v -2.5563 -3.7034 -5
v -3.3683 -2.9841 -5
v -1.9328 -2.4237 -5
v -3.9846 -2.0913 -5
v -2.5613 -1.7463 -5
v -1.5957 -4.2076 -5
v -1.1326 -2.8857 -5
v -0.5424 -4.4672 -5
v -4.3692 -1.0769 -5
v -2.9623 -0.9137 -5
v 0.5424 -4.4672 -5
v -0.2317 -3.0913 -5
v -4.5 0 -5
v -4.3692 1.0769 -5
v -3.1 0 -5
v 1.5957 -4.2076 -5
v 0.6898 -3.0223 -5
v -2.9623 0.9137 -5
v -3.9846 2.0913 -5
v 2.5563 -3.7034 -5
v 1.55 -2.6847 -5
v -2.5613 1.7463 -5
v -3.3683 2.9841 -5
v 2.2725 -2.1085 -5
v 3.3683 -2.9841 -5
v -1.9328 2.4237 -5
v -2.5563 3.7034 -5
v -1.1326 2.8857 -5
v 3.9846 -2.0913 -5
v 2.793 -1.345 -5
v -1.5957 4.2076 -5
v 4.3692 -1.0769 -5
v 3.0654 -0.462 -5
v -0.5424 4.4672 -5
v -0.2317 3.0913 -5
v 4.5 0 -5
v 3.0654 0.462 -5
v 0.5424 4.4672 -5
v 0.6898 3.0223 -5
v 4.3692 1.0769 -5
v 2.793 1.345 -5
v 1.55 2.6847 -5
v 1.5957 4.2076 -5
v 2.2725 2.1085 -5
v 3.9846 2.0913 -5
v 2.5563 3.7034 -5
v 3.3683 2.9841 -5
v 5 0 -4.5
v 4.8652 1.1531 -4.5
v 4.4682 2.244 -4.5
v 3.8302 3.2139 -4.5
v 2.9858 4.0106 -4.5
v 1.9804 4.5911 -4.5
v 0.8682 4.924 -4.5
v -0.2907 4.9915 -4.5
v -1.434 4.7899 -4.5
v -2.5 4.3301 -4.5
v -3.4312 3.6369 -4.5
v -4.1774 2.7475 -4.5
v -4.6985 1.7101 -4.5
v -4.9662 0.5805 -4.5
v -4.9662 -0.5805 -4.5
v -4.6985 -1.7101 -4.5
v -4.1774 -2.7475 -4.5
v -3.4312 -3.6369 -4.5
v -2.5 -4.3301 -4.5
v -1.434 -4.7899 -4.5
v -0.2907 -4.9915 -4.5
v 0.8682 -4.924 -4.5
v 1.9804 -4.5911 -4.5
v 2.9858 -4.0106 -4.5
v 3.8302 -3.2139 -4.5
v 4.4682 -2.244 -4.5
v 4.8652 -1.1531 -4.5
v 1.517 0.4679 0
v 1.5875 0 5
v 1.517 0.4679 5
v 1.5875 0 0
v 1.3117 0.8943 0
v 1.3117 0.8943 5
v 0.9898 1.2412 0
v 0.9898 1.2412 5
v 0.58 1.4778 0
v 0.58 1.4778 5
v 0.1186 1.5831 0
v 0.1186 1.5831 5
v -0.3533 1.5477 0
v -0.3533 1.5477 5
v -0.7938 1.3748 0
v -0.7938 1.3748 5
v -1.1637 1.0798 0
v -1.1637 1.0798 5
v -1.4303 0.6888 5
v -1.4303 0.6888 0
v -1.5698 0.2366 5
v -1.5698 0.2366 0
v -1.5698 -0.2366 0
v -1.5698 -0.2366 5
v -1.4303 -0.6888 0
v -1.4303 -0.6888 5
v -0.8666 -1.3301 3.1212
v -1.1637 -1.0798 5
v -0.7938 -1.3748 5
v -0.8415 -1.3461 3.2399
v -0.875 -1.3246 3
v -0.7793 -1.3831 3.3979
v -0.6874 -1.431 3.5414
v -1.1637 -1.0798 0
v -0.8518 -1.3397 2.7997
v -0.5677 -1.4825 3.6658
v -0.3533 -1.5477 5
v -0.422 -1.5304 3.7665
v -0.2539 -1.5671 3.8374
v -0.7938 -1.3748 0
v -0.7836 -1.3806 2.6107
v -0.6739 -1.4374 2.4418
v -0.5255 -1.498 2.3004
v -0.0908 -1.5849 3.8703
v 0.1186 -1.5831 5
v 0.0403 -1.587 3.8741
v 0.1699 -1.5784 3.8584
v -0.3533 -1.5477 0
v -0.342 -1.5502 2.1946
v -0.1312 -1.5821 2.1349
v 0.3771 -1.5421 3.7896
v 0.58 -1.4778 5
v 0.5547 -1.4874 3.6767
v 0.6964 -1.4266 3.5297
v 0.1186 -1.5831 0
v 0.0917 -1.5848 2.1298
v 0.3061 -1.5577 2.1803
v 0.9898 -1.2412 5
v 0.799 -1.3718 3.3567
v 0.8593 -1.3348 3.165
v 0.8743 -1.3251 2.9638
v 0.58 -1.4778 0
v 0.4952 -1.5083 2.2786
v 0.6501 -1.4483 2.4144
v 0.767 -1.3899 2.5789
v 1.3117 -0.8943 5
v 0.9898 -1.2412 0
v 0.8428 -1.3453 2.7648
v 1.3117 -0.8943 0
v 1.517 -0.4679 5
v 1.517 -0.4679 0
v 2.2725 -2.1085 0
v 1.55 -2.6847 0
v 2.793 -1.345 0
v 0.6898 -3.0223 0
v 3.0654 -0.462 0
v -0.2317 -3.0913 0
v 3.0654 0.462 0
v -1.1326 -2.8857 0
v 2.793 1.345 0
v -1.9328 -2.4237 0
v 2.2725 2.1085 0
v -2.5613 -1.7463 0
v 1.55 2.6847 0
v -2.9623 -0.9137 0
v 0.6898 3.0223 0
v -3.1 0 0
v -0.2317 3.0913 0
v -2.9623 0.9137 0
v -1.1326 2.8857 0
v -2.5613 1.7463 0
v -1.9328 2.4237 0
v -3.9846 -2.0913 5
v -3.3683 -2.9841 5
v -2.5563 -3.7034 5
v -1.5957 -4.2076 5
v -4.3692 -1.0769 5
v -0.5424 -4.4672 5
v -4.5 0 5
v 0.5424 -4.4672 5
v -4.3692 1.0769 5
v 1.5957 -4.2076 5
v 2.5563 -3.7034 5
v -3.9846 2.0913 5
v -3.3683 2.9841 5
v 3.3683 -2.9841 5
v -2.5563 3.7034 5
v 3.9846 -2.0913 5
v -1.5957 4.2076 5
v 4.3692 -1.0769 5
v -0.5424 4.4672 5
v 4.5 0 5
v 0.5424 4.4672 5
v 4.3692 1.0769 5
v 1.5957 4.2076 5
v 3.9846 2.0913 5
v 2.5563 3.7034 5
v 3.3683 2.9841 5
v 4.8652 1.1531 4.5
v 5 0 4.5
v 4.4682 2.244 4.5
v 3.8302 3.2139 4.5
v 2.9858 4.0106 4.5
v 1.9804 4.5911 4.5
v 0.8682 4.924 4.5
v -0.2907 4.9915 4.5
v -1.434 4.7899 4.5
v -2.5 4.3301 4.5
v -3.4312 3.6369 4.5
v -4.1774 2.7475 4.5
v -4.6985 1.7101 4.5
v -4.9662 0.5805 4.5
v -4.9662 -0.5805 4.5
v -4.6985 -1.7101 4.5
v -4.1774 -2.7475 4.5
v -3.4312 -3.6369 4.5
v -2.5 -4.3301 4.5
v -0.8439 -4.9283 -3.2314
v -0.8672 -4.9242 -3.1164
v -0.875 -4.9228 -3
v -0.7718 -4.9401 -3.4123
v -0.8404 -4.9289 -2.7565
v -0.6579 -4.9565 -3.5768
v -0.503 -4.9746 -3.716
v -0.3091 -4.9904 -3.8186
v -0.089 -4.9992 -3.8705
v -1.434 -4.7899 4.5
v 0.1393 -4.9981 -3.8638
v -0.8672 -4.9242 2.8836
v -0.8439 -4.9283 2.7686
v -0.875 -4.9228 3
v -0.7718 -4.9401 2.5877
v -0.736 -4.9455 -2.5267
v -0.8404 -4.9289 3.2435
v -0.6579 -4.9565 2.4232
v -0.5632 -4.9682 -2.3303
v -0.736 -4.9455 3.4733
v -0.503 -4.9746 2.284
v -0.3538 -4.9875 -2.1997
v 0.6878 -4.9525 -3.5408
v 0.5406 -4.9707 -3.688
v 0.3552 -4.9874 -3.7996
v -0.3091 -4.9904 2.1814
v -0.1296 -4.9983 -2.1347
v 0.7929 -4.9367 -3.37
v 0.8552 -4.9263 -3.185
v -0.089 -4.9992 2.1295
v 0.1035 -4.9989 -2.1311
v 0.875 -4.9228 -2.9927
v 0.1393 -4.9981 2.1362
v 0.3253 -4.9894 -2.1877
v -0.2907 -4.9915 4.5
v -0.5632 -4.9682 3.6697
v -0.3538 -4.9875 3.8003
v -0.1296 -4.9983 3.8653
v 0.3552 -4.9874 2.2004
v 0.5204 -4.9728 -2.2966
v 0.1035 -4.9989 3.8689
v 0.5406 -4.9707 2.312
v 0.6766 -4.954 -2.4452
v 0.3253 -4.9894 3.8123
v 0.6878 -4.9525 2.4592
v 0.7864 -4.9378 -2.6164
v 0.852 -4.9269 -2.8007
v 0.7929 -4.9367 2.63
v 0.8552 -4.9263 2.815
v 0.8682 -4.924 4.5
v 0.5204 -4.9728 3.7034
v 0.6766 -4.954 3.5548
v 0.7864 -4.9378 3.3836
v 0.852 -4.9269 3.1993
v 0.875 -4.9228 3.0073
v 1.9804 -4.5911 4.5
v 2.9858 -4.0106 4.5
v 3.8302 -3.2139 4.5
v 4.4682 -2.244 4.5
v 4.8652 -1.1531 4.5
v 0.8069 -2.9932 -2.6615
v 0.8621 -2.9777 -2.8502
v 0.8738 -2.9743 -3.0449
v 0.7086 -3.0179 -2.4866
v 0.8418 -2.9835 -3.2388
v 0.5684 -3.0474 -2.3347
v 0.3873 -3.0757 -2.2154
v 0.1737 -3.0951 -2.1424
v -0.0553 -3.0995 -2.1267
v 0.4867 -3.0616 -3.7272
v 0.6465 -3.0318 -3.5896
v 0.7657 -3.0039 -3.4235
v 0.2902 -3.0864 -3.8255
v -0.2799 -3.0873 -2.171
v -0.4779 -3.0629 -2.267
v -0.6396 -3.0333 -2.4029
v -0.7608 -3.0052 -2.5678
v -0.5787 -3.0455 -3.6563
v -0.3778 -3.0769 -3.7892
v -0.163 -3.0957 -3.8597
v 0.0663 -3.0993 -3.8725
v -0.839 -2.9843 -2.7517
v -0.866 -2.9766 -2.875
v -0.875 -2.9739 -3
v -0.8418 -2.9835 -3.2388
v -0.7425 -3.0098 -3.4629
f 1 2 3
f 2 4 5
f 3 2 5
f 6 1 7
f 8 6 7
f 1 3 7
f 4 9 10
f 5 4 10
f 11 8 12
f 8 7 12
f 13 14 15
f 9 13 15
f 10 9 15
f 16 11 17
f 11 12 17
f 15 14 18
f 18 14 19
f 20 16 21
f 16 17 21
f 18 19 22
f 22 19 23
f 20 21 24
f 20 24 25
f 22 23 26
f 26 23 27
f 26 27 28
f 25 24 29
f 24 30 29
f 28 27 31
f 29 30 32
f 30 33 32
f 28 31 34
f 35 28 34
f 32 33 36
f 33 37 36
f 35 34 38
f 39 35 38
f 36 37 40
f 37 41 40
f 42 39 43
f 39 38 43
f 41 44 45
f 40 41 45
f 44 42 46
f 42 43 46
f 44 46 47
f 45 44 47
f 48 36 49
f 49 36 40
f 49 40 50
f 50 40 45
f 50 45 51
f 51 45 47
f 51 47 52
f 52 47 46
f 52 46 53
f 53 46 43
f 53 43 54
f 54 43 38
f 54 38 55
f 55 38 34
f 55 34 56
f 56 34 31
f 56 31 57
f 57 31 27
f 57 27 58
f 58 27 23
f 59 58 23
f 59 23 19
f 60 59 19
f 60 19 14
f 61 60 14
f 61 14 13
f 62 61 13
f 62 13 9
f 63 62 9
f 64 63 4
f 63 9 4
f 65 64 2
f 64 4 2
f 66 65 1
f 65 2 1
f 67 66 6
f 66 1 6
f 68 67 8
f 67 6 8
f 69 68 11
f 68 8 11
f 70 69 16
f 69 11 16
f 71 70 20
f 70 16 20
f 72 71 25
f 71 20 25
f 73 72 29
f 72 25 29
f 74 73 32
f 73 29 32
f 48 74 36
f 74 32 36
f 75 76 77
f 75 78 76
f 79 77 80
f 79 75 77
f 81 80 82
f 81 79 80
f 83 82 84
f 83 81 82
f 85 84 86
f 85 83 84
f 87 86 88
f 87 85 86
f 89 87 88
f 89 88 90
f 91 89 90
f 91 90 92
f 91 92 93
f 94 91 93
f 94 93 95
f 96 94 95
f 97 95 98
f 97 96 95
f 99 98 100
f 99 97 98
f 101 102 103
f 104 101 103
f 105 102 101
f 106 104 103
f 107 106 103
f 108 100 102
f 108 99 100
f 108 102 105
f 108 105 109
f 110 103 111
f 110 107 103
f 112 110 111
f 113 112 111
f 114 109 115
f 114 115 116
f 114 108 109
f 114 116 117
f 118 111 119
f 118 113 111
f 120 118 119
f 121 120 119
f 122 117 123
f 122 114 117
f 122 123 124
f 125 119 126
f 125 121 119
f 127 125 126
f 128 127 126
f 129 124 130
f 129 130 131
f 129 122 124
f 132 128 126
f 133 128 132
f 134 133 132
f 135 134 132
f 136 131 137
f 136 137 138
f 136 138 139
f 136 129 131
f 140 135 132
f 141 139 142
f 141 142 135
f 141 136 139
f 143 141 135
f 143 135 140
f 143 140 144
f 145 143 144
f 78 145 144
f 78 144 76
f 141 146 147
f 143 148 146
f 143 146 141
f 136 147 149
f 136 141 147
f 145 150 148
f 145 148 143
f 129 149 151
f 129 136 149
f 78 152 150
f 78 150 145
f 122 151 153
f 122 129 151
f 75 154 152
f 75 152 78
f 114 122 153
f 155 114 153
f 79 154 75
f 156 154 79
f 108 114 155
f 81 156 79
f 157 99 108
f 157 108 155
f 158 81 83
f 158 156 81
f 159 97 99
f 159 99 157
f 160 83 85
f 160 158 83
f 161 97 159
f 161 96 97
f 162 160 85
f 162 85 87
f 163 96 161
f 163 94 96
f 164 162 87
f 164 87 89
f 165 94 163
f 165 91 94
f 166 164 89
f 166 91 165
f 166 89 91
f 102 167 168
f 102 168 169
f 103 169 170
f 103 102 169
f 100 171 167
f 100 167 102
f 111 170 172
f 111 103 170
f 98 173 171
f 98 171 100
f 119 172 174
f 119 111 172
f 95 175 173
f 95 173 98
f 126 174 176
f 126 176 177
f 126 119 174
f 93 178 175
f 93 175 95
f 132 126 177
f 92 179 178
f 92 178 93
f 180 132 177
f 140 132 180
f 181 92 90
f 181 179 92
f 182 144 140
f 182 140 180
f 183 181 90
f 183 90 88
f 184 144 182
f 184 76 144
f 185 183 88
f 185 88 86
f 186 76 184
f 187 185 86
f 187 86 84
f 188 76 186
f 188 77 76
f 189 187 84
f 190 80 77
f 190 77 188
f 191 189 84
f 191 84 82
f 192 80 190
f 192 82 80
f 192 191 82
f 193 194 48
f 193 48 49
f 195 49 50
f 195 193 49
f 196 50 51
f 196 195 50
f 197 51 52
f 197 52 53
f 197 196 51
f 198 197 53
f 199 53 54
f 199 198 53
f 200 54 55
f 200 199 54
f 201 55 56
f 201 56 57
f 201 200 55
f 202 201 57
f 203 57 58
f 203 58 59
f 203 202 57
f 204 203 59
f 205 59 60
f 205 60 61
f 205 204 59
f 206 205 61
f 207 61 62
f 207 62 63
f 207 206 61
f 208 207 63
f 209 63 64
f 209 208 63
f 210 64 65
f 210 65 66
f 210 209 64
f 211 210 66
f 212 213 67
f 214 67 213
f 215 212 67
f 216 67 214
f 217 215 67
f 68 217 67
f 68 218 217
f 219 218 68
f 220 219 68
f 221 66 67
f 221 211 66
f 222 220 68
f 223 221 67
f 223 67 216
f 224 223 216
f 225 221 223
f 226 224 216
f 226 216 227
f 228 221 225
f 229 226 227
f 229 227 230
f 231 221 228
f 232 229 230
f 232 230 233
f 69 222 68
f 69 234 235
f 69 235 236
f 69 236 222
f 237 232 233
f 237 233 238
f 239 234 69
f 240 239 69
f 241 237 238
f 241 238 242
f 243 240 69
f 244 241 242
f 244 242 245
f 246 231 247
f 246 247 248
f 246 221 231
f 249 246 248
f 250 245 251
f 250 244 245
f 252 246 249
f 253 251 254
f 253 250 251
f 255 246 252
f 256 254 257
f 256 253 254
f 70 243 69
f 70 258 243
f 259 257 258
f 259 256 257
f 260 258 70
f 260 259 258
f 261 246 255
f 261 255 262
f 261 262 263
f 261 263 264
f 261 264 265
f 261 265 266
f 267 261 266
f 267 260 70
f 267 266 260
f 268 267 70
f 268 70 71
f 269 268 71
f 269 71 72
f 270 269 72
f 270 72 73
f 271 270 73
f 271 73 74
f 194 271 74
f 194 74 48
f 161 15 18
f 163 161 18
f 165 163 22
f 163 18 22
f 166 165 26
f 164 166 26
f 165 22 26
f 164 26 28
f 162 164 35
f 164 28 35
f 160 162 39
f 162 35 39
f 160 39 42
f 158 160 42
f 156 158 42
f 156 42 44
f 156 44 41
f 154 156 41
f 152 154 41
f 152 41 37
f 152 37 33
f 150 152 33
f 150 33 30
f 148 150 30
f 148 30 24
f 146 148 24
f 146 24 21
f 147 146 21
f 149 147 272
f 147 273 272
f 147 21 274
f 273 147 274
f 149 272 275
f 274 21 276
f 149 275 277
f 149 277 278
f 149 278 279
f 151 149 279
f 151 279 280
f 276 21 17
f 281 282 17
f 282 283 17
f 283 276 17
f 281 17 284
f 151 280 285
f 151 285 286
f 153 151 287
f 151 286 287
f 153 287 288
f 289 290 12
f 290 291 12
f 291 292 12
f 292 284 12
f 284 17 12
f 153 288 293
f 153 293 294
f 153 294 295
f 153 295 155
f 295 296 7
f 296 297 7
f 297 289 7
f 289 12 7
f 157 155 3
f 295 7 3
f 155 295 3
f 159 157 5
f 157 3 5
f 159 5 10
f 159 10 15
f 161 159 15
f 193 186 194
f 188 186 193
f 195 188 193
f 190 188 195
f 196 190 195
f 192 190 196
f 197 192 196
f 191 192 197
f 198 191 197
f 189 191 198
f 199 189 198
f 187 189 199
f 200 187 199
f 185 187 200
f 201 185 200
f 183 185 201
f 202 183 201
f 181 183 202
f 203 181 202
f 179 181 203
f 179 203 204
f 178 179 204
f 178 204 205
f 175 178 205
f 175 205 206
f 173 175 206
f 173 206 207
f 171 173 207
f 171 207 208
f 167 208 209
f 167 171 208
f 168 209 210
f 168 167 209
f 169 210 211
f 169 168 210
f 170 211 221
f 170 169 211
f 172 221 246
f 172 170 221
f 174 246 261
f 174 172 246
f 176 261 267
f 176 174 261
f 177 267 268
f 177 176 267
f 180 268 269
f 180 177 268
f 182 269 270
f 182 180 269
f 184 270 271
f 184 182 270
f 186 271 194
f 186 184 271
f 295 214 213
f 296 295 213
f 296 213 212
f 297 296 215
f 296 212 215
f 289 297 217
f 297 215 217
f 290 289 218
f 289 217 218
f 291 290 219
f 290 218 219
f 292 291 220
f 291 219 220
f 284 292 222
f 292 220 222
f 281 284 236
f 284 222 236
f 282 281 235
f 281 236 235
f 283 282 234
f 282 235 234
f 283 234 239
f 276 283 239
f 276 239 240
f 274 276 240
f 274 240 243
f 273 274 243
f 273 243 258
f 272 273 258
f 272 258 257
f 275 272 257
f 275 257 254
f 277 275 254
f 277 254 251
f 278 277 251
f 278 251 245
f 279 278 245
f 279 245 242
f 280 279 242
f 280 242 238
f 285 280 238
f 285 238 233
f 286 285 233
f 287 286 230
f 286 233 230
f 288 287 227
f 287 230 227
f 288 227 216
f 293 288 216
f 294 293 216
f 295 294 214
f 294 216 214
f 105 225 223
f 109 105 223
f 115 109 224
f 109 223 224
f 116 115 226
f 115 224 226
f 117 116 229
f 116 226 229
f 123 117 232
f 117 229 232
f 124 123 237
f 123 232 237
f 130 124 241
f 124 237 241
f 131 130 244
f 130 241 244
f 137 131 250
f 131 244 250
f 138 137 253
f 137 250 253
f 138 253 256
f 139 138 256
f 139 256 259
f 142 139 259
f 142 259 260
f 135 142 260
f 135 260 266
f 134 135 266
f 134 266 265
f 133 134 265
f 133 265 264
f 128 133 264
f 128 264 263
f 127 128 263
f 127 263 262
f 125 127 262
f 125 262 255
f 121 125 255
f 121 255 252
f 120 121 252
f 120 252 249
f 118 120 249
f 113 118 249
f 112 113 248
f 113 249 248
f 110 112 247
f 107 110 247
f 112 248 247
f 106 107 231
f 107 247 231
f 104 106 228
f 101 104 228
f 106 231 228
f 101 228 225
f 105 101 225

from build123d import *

# Parameters (mm, degrees)
SKETCH1_R                     = 5
SKETCH1_R_2                   = 1.5875
BOSS_EXTRUDE1_DEPTH           = 5
SKETCH2_R                     = 3.1
CUT_EXTRUDE1_DEPTH            = 5
CHAMFER1_SIZE                 = 0.5
M2_2X0_45_TAPPED_HOLE1_REACH  = 14.247
M2_2X0_45_TAPPED_HOLE1_BORE_R = 0.875


with BuildPart() as part:
    # Sketch1 → Boss-Extrude1 (new, symmetric)
    with BuildSketch(Plane.XY):
        Circle(SKETCH1_R)
        Circle(SKETCH1_R_2, mode=Mode.SUBTRACT)
    extrude(amount=BOSS_EXTRUDE1_DEPTH, both=True)

    # Sketch2 → Cut-Extrude1 (cut)
    with BuildSketch(Plane(origin=(0, 0, -5), x_dir=(-1, 0, 0), z_dir=(0, 0, -1))):
        Circle(SKETCH2_R)
    extrude(amount=-CUT_EXTRUDE1_DEPTH, mode=Mode.SUBTRACT)

    # Chamfer1
    chamfer1_edges = [part.edges().sort_by_distance(p)[0] for p in [
        (-5, 0, -5),
        (-5, 0, 5),
    ]]
    chamfer(chamfer1_edges, length=CHAMFER1_SIZE)

    # M2.2x0.45 Tapped Hole1 bore → M2.2x0.45 Tapped Hole1 (cut, up to next)
    with BuildSketch(Plane(origin=(0, -5, 0), x_dir=(-1, 0, 0), z_dir=(0, -1, 0)), mode=Mode.PRIVATE) as m2_2x0_45_tapped_hole1_sk1:
        with Locations((0, -3)):
            Circle(M2_2X0_45_TAPPED_HOLE1_BORE_R)
    m2_2x0_45_tapped_hole1_tool1 = extrude(m2_2x0_45_tapped_hole1_sk1.sketch, amount=-M2_2X0_45_TAPPED_HOLE1_REACH, mode=Mode.PRIVATE) & part.part
    # M2.2x0.45 Tapped Hole1 bore → M2.2x0.45 Tapped Hole1 (cut, up to next)
    with BuildSketch(Plane(origin=(0, -5, 0), x_dir=(-1, 0, 0), z_dir=(0, -1, 0)), mode=Mode.PRIVATE) as m2_2x0_45_tapped_hole1_sk2:
        with Locations((0, 3)):
            Circle(M2_2X0_45_TAPPED_HOLE1_BORE_R)
    m2_2x0_45_tapped_hole1_tool2 = extrude(m2_2x0_45_tapped_hole1_sk2.sketch, amount=-M2_2X0_45_TAPPED_HOLE1_REACH, mode=Mode.PRIVATE) & part.part
    add(m2_2x0_45_tapped_hole1_tool1.solids().sort_by_distance((0, -5, 3))[0], mode=Mode.SUBTRACT)
    add(m2_2x0_45_tapped_hole1_tool2.solids().sort_by_distance((0, -5, -3))[0], mode=Mode.SUBTRACT)


solid = part.part
